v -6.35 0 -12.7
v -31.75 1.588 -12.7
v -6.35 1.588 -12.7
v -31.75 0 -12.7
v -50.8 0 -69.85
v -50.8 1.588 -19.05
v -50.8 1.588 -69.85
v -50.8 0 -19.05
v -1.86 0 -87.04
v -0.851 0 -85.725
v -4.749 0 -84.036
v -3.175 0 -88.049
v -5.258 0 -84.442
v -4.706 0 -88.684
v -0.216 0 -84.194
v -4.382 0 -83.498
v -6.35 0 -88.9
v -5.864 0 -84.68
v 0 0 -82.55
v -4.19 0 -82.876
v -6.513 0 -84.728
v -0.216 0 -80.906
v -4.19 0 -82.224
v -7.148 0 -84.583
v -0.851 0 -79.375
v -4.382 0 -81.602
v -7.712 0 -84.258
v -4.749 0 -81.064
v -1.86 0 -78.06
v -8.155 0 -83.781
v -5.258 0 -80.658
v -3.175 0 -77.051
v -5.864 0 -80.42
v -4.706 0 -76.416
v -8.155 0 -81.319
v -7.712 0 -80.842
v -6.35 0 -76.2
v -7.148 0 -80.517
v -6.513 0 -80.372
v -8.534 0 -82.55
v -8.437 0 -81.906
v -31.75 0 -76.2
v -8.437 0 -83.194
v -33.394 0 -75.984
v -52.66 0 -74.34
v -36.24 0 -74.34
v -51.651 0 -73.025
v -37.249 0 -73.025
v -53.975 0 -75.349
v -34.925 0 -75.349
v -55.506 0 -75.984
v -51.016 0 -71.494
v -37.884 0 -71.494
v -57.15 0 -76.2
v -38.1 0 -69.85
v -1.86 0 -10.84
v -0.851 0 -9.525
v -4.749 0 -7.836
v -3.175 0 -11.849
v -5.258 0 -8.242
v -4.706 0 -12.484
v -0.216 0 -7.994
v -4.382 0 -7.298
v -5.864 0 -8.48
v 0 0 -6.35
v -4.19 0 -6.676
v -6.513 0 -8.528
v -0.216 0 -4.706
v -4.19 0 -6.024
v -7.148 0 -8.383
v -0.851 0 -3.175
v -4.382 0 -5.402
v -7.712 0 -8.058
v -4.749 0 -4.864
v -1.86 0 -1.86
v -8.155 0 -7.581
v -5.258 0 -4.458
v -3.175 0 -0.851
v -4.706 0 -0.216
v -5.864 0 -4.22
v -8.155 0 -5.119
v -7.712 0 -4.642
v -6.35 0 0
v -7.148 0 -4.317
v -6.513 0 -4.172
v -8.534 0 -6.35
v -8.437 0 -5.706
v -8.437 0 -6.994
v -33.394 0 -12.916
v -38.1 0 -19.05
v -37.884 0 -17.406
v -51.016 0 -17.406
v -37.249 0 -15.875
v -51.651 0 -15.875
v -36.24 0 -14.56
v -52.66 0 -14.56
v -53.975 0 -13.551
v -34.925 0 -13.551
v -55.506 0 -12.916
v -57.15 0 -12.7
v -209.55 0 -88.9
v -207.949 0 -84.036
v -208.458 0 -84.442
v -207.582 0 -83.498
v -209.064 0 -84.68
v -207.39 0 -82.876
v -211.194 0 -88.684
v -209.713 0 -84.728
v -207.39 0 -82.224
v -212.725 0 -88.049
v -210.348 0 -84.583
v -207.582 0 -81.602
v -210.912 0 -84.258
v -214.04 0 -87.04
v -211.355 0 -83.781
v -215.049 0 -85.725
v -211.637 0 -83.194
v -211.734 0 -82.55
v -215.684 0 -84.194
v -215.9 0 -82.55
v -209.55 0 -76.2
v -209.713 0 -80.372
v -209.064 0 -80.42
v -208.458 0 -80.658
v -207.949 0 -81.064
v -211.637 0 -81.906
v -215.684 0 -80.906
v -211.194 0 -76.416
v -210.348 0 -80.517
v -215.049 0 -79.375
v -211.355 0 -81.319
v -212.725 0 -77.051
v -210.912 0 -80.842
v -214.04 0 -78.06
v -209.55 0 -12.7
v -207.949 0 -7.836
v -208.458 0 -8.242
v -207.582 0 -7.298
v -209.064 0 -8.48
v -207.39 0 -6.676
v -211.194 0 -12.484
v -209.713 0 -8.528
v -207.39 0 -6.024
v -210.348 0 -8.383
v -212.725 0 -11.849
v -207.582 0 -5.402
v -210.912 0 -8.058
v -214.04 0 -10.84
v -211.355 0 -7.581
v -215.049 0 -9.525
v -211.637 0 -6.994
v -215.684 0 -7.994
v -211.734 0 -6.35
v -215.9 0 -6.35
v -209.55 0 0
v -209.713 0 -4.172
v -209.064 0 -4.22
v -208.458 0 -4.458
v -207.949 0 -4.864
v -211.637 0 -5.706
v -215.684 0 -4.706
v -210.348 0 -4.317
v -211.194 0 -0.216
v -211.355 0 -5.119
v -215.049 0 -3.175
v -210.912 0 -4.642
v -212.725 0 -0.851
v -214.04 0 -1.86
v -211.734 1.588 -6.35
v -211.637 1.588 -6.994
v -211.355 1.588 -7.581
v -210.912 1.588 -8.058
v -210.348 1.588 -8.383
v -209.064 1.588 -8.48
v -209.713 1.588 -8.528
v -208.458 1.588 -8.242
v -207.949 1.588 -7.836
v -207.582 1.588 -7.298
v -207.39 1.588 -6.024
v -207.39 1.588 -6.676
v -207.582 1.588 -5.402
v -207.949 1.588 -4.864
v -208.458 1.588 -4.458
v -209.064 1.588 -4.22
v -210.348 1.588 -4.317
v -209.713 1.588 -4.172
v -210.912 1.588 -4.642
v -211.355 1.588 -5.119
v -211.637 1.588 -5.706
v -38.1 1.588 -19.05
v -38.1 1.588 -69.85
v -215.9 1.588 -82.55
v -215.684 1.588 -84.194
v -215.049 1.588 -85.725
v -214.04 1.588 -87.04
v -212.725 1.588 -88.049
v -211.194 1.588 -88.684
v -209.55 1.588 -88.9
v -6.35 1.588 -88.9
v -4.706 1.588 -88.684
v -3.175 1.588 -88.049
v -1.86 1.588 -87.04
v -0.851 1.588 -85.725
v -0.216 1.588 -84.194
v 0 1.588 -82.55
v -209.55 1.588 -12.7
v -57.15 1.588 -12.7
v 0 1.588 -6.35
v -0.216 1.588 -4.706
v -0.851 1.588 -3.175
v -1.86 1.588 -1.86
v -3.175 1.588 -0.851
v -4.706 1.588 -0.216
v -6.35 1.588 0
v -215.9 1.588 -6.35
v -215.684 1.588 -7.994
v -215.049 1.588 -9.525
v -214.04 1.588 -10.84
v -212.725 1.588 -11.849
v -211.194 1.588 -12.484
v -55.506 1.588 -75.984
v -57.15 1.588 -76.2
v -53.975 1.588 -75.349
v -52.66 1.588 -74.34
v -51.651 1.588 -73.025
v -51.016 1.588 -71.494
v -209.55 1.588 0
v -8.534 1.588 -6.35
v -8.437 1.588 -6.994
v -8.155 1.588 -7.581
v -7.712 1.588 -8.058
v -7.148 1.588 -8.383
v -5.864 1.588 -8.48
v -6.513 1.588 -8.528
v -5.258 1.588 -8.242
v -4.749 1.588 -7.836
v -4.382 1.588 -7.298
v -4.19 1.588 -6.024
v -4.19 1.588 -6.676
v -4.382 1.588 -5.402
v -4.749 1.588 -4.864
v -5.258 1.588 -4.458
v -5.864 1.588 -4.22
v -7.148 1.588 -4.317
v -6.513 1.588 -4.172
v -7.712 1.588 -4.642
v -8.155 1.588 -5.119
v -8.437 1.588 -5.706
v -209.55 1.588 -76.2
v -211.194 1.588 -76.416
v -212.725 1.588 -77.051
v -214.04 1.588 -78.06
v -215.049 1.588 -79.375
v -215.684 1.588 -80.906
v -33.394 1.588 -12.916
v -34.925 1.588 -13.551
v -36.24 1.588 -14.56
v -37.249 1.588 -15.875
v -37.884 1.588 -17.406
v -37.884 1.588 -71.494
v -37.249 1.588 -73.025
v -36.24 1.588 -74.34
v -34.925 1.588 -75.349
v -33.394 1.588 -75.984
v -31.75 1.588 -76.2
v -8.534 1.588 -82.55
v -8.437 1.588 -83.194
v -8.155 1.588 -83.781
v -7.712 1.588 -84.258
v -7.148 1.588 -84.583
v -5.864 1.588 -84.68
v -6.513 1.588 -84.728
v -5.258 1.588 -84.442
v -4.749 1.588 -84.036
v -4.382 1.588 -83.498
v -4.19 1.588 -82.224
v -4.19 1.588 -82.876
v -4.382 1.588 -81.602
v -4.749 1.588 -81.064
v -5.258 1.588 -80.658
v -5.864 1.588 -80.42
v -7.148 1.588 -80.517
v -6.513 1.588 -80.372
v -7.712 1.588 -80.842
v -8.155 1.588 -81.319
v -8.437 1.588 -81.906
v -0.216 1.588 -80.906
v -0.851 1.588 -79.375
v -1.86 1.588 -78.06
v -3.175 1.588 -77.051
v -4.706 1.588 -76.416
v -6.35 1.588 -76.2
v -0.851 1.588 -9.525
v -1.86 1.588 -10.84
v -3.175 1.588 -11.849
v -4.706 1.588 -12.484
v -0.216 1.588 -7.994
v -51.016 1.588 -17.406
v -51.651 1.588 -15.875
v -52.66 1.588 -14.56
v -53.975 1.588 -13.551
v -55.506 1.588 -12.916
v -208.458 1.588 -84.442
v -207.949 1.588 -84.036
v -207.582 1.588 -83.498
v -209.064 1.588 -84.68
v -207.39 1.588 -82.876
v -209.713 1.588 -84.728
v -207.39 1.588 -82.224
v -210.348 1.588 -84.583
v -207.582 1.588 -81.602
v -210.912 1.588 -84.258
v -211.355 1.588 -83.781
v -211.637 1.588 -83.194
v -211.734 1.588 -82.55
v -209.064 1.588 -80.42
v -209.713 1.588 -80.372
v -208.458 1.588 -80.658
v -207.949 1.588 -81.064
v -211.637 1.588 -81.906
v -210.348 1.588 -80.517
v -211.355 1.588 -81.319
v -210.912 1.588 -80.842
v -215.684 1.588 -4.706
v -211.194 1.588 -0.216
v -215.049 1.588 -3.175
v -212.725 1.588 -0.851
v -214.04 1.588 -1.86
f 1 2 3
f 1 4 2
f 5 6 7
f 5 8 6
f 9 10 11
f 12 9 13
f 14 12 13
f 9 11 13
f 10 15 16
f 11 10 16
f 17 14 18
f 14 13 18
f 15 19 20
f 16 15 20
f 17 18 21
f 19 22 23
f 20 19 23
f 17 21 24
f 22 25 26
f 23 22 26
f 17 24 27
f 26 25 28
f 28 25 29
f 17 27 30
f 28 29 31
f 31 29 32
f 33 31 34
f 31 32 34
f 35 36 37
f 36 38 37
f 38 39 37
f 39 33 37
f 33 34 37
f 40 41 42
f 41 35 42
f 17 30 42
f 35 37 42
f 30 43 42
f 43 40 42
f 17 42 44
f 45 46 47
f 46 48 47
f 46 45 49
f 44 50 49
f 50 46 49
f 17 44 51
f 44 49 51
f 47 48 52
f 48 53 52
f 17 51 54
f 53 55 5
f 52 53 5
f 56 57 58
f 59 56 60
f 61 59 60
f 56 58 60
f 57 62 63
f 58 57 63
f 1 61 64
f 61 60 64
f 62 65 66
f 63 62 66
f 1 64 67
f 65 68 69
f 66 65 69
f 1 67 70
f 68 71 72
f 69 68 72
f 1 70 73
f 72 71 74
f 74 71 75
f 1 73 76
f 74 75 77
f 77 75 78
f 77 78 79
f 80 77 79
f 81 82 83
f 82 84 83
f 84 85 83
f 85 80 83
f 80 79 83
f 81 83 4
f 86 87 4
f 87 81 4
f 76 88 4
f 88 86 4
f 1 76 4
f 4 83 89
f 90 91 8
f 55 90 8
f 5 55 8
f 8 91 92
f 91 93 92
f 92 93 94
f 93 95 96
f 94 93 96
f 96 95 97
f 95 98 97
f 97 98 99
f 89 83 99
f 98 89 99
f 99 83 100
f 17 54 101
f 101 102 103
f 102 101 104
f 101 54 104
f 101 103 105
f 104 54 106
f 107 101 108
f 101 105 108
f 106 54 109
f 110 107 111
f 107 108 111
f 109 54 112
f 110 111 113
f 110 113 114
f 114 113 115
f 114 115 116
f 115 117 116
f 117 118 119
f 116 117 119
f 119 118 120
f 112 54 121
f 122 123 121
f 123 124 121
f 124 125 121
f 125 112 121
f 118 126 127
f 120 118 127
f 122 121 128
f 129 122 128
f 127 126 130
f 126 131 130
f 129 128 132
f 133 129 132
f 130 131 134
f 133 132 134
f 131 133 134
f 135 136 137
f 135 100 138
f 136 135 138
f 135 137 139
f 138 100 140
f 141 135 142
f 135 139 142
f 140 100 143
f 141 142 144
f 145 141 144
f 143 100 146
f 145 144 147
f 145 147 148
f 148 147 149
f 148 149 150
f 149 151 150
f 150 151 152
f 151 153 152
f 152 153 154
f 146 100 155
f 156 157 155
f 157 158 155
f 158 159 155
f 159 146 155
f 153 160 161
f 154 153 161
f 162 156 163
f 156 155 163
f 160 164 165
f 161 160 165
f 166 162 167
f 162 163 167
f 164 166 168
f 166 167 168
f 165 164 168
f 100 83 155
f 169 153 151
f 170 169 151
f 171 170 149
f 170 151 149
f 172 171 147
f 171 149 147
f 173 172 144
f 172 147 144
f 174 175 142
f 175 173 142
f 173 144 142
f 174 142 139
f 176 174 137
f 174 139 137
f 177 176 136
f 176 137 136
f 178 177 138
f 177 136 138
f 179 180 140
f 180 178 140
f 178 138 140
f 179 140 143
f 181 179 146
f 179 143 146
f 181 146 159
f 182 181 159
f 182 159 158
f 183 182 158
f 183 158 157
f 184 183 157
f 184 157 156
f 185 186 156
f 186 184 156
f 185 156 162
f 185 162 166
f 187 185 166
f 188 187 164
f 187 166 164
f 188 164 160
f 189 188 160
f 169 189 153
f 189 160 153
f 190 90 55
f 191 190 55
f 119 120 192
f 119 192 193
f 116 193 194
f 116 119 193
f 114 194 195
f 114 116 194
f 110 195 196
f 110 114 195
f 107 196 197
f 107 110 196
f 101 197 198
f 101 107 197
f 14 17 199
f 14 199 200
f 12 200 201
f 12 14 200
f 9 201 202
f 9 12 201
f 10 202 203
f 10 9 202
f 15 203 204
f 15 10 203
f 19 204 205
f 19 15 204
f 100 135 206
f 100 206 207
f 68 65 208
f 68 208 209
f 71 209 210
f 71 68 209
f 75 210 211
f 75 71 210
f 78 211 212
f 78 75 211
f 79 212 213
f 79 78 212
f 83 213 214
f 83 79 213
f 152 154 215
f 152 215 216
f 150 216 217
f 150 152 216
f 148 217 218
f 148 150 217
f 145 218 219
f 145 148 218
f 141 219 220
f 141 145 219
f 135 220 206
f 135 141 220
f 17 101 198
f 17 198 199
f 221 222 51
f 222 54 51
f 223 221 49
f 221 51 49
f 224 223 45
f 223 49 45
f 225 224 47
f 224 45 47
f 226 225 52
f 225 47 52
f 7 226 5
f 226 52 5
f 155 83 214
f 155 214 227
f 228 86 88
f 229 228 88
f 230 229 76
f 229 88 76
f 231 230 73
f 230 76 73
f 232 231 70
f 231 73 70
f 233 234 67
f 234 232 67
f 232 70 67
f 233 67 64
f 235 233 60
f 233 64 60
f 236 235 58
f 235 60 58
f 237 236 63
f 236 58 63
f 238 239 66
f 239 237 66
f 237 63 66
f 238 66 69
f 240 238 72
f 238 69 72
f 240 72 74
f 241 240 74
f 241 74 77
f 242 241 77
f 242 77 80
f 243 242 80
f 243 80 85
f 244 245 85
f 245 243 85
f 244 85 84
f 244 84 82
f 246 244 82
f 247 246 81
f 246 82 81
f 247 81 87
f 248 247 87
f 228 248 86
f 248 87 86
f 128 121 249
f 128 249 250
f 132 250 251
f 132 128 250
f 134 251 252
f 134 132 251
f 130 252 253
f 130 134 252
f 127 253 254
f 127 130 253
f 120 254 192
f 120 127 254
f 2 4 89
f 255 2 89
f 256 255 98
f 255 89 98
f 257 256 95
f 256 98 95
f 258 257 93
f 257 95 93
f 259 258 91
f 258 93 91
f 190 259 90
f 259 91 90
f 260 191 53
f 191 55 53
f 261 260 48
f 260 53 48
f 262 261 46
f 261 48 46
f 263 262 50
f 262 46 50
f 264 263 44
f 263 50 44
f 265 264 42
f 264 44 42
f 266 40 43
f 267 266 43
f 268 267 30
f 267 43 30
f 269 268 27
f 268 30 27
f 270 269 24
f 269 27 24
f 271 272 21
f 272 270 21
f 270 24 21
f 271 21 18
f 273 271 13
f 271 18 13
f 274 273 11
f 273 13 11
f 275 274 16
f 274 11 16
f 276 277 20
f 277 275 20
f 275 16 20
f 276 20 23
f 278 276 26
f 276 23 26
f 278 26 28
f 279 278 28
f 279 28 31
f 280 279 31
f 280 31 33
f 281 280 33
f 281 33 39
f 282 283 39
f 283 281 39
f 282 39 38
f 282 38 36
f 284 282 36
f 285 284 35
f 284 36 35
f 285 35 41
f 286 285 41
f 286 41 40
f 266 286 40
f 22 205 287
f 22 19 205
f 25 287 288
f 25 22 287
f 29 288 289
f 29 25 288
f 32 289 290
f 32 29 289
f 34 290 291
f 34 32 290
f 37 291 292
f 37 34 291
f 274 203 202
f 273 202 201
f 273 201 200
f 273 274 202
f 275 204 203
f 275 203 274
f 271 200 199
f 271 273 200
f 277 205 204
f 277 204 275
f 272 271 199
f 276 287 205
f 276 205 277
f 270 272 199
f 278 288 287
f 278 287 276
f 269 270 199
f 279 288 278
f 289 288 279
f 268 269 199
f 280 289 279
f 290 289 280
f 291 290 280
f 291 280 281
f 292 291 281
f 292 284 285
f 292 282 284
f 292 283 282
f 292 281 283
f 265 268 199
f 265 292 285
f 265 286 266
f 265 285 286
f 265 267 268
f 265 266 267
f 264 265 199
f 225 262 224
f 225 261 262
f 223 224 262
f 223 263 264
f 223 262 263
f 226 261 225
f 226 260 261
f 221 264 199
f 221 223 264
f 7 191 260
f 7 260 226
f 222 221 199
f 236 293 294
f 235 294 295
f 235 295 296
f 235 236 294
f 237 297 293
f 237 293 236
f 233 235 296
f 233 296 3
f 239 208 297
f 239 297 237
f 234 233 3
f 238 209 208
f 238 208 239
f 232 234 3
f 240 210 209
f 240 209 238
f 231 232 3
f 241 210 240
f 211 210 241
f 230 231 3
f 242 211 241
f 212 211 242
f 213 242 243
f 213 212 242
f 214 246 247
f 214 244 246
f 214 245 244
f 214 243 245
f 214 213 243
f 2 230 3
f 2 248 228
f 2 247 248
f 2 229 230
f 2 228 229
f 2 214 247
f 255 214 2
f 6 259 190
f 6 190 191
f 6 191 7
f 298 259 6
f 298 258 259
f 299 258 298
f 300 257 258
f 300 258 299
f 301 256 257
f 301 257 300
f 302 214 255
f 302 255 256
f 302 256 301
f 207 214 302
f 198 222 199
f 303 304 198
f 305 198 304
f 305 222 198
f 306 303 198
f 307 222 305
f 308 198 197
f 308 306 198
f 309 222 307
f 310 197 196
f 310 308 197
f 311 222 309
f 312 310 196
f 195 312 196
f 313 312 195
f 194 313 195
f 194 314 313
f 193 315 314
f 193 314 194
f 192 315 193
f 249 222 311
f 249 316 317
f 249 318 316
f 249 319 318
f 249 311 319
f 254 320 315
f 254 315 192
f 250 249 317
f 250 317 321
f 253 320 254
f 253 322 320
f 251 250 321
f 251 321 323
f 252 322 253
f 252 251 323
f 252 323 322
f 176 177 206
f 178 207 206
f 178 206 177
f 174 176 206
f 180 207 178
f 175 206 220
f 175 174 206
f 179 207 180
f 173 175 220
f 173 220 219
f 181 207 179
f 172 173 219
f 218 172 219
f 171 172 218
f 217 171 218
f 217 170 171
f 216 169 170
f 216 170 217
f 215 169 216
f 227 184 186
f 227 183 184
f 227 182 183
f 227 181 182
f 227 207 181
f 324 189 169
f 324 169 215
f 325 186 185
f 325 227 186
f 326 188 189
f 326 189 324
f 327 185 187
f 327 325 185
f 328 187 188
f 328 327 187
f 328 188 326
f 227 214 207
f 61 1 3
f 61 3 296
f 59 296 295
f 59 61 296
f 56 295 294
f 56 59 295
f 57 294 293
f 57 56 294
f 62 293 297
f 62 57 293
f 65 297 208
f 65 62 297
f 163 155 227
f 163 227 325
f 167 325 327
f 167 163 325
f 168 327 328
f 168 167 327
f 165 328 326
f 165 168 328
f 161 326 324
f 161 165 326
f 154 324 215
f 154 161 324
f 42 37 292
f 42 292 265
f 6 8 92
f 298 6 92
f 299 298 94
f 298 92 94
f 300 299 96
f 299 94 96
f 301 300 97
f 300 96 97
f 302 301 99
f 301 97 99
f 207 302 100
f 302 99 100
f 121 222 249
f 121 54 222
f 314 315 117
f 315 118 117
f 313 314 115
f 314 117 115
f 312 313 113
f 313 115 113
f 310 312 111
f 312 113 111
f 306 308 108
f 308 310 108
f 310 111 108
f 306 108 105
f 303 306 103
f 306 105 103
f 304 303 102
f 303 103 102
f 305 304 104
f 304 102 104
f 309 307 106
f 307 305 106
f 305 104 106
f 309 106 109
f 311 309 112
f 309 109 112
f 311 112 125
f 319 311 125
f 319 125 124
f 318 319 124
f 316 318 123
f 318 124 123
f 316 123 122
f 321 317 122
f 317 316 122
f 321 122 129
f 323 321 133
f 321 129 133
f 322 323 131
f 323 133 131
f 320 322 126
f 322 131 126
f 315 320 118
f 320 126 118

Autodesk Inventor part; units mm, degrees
ref_plane "YZ Plane" through (0, 0, 0) normal (1, 0, 0) x (0, 1, 0)
ref_plane "XZ Plane" through (0, 0, 0) normal (0, 1, 0) x (-1, 0, 0)
ref_plane "XY Plane" through (0, 0, 0) normal (0, 0, 1) x (1, 0, 0)
sketch "Sketch1" plane through (0, 0, 0) normal (0, 1, 0) x (-1, 0, 0)
  line L0 (6.35, 0) -> (209.55, 0)
  line L1 (215.9, -6.35) -> (215.9, -6.35)
  circle A0 centre (6.35, -6.35) radius 2.1844
  circle A1 centre (209.55, -6.35) radius 2.1844
  line L2 (38.1, -19.05) -> (38.1, -69.85)
  line L3 (215.9, -82.55) -> (215.9, -82.55)
  line L4 (209.55, -88.9) -> (6.35, -88.9)
  line L5 (0, -82.55) -> (0, -82.55)
  line L6 (50.8, -19.05) -> (50.8, -69.85)
  line L7 (209.55, -12.7) -> (57.15, -12.7)
  line L8 (31.75, -12.7) -> (6.35, -12.7)
  line L9 (6.35, -76.2) -> (31.75, -76.2)
  line L10 (57.15, -76.2) -> (209.55, -76.2)
  arc A2 (57.15, -12.7) -> (50.8, -19.05) centre (57.15, -19.05) ccw
  arc A3 (38.1, -19.05) -> (31.75, -12.7) centre (31.75, -19.05) ccw
  arc A4 (31.75, -76.2) -> (38.1, -69.85) centre (31.75, -69.85) ccw
  arc A5 (50.8, -69.85) -> (57.15, -76.2) centre (57.15, -69.85) ccw
  line L11 (0, -6.35) -> (0, -6.35)
  line L12 (0, -76.2) -> (0, -88.9)
  circle A6 centre (209.55, -82.55) radius 2.1844
  circle A7 centre (6.35, -82.55) radius 2.1844
  arc A8 (215.9, -6.35) -> (209.55, 0) centre (209.55, -6.35) ccw
  arc A9 (209.55, -12.7) -> (215.9, -6.35) centre (209.55, -6.35) ccw
  arc A10 (0, -6.35) -> (6.35, -12.7) centre (6.35, -6.35) ccw
  arc A11 (6.35, 0) -> (0, -6.35) centre (6.35, -6.35) ccw
  arc A12 (6.35, -76.2) -> (0, -82.55) centre (6.35, -82.55) ccw
  arc A13 (0, -82.55) -> (6.35, -88.9) centre (6.35, -82.55) ccw
  arc A14 (215.9, -82.55) -> (209.55, -76.2) centre (209.55, -82.55) ccw
  arc A15 (209.55, -88.9) -> (215.9, -82.55) centre (209.55, -82.55) ccw
  point P0 (0, 0)
  point P1 (215.9, 0)
  point P2 (215.9, -12.7)
  point P3 (0, -12.7)
  point P4 (38.1, -12.7)
  point P5 (38.1, -76.2)
  point P6 (215.9, -76.2)
  point P7 (215.9, -88.9)
  dimension "d0" = 215.9
  dimension "d1" = 12.7
  dimension "d2" = 4.3688
  dimension "d3" = 63.5
  dimension "d4" = 12.7
  dimension "d5" = 12.7
  dimension "d6" = 38.1
  dimension "d7" = 6.35
  dimension "d8" = 6.35
extrude "Extrusion1" add sketch "Sketch1" along normal blind 1.5875
properties part number "Ring Guardd"
